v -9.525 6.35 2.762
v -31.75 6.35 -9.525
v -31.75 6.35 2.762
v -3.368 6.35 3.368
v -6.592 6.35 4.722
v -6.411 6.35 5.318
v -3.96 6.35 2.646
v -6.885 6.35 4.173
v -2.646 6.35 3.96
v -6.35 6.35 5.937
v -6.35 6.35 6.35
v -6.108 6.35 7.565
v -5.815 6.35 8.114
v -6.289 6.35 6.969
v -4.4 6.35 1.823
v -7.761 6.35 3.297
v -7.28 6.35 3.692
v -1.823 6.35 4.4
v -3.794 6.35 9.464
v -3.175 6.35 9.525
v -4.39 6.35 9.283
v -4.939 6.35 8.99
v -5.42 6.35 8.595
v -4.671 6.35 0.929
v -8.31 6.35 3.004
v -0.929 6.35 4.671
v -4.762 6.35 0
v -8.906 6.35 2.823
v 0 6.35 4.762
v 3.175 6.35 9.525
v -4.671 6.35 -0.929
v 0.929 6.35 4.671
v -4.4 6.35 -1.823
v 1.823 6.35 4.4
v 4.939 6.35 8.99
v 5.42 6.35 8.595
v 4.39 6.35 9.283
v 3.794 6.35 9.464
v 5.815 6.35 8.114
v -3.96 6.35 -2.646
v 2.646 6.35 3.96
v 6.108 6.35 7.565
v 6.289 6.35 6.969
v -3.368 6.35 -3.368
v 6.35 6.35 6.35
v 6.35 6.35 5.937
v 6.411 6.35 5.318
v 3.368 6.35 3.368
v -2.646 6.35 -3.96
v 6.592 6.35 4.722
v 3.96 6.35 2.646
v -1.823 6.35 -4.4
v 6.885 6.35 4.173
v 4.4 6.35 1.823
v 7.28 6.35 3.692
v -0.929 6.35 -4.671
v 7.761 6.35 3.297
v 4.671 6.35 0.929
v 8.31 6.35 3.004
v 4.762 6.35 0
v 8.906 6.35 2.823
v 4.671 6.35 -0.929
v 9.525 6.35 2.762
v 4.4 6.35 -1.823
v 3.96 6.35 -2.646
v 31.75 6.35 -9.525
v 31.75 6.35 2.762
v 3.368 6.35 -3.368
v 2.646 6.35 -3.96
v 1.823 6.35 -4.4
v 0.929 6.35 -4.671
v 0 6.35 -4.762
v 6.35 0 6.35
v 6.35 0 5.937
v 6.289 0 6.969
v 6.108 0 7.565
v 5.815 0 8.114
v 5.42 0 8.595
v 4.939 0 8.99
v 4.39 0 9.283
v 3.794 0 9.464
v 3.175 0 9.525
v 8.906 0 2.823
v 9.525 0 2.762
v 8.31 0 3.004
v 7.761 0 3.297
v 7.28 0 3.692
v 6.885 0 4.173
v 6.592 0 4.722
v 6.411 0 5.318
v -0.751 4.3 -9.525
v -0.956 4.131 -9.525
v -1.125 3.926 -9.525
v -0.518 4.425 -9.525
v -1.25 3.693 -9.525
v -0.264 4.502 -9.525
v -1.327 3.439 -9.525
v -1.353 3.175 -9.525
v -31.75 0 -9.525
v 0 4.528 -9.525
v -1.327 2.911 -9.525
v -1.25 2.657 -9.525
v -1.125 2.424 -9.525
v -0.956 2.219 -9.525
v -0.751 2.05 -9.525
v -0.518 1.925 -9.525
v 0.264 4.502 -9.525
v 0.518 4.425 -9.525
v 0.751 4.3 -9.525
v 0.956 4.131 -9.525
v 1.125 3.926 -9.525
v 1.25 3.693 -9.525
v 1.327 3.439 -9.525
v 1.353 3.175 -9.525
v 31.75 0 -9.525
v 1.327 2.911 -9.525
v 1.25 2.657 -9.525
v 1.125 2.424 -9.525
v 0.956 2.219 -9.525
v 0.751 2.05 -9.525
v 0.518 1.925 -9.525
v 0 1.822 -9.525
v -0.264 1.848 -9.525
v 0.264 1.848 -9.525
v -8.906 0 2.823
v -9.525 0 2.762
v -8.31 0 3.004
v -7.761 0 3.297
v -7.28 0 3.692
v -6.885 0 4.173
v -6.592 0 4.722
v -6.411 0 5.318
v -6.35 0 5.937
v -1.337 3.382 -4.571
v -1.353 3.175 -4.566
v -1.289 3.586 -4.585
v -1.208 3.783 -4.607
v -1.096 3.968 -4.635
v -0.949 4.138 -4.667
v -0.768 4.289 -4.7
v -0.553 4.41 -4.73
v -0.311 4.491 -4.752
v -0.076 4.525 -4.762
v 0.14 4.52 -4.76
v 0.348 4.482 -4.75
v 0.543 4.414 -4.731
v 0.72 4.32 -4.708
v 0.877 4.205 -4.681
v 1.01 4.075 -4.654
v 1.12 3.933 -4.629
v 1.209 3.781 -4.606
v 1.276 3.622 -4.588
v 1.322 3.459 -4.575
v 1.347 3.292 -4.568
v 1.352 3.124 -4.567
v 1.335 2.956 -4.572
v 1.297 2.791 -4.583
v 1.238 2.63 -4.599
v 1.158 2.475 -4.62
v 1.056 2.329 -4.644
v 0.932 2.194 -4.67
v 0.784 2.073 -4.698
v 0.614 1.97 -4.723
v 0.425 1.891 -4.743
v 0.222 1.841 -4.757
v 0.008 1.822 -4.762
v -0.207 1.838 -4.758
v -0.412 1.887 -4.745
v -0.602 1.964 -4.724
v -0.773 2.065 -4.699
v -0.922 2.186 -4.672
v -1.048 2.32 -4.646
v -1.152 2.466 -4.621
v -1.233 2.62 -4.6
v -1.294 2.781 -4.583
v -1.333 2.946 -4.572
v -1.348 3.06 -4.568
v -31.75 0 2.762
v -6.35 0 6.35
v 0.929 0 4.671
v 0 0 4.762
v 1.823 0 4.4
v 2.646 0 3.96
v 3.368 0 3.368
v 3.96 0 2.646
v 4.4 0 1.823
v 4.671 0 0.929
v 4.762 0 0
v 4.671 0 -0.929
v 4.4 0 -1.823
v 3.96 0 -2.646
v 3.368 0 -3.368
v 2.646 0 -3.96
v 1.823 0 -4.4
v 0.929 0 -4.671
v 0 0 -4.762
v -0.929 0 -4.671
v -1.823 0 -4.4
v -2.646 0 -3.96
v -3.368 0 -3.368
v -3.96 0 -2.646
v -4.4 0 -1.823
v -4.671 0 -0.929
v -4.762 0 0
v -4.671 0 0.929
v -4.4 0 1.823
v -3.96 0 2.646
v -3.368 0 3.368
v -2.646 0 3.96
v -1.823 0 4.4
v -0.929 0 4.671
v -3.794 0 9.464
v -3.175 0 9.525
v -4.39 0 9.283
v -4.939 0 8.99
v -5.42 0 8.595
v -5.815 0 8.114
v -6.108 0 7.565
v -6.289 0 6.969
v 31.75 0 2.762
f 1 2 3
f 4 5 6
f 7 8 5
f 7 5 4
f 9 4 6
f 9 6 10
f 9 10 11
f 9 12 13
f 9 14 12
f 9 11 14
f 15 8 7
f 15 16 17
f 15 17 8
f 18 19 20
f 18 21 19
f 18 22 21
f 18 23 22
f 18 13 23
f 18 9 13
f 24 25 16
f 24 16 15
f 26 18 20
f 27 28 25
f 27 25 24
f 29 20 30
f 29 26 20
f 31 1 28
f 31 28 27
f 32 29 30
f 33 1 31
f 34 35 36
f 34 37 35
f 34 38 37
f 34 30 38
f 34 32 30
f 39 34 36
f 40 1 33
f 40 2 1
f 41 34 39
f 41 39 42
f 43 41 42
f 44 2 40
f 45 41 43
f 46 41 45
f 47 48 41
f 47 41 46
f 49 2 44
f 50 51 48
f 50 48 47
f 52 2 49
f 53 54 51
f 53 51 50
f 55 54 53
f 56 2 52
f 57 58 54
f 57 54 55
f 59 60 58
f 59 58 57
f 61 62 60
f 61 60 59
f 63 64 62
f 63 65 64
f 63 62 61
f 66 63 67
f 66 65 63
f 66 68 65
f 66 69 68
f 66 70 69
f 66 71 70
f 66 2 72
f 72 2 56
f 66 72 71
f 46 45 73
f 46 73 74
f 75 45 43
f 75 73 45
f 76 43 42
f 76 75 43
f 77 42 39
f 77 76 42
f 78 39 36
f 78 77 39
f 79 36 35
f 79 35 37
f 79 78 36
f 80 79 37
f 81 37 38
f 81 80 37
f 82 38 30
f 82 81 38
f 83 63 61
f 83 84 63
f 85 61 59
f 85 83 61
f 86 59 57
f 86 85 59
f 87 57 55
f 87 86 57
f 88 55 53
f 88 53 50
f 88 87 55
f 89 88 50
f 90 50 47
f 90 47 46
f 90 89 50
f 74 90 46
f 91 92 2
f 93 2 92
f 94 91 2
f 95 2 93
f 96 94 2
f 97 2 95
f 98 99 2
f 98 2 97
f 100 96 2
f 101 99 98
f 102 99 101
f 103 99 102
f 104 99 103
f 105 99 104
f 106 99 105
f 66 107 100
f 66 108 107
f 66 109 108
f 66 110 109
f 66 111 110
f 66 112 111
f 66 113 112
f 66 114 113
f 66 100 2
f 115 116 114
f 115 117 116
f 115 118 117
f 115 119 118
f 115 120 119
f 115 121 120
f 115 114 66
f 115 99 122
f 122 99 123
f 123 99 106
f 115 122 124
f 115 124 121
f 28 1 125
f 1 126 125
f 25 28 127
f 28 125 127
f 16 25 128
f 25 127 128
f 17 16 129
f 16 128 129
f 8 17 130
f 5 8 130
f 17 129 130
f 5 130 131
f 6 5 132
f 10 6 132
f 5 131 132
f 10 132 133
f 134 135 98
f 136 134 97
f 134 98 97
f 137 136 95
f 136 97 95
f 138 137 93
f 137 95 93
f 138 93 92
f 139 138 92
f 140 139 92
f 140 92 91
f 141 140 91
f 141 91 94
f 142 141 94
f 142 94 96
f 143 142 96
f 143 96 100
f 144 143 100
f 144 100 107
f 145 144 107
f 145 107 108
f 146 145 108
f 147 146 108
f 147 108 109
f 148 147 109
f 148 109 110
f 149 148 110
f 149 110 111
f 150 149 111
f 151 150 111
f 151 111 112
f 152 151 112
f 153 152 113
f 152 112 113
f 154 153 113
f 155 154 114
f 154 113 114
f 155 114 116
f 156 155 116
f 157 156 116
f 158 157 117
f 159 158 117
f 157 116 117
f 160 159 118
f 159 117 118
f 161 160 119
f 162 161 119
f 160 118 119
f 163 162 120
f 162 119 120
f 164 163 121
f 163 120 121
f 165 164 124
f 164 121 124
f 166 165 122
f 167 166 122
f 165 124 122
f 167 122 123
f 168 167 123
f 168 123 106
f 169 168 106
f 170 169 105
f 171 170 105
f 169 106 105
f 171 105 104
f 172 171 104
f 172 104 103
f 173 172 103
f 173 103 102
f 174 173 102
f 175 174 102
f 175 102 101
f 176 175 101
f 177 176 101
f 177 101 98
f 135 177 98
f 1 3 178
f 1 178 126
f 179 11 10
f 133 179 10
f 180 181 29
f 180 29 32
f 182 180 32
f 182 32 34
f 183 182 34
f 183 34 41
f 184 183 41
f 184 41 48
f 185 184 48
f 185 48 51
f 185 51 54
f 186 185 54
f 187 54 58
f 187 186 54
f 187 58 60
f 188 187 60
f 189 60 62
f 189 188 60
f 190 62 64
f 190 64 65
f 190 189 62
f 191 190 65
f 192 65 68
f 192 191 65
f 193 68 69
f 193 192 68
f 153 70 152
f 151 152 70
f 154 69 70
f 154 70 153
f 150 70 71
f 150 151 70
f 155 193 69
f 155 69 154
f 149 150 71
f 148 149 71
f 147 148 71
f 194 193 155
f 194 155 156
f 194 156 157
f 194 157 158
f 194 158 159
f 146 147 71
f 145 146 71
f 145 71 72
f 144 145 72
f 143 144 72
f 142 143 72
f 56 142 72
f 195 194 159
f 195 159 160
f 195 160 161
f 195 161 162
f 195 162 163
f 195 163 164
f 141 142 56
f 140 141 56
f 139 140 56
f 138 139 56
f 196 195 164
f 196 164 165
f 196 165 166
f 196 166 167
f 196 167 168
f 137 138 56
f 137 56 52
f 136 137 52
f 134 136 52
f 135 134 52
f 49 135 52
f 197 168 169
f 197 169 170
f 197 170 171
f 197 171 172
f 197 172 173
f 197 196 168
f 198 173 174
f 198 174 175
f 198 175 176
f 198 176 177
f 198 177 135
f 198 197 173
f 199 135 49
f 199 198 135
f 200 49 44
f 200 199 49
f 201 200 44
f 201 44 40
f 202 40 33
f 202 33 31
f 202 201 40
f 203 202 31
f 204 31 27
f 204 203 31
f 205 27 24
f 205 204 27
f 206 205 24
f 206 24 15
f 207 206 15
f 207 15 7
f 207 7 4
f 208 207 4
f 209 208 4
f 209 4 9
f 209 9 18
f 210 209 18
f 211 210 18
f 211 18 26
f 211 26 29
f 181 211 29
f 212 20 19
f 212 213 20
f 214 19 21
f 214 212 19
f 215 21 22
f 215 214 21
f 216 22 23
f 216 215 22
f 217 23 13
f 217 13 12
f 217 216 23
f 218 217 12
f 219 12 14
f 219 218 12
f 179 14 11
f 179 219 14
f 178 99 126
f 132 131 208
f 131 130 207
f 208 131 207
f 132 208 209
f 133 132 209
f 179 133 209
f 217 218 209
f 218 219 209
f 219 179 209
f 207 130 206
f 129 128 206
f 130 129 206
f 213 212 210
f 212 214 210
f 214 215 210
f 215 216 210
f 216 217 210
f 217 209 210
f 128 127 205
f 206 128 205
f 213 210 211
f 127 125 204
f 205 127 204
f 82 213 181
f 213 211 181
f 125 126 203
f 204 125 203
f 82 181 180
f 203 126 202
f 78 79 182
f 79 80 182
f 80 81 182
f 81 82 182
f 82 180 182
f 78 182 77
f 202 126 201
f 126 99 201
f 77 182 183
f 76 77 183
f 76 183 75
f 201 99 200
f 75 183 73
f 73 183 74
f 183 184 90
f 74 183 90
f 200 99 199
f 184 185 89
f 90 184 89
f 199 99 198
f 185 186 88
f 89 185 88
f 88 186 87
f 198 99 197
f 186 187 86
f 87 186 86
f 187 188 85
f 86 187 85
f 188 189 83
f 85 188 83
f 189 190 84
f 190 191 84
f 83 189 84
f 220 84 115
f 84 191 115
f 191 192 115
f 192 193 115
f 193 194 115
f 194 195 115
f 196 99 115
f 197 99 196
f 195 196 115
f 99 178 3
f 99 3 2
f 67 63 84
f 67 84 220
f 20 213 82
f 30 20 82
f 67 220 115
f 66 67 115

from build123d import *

# Parameters (mm, degrees)
SKETCH1_W                  = 63.5
SKETCH1_H                  = 19.05
SKETCH1_R                  = 4.7625
BOSS_EXTRUDE1_DEPTH        = 6.35
F_6_32_TAPPED_HOLE1_REACH  = 39.567
F_6_32_TAPPED_HOLE1_BORE_R = 1.35255
CUT_EXTRUDE1_REACH         = 35.751
SKETCH5_W                  = 25.4
SKETCH5_H                  = 6.7627246
FILLET1_R                  = 3.175


with BuildPart() as part:
    # Sketch1 → Boss-Extrude1 (new body)
    with BuildSketch(Plane(origin=(0, 0, 0), x_dir=(1, 0, 0), z_dir=(0, 1, 0))):
        Rectangle(SKETCH1_W, SKETCH1_H)
        with Locations(Location((0, 0, 0), (0, 0, 270))):
            Circle(SKETCH1_R, mode=Mode.SUBTRACT)
    extrude(amount=BOSS_EXTRUDE1_DEPTH)

    # #6-32 Tapped Hole1 bore → #6-32 Tapped Hole1 (cut, up to next)
    with BuildSketch(Plane(origin=(0, 0, -9.525), x_dir=(-1, 0, 0), z_dir=(0, 0, -1)), mode=Mode.PRIVATE) as f_6_32_tapped_hole1_sk1:
        with Locations((0, 3.175)):
            Circle(F_6_32_TAPPED_HOLE1_BORE_R)
    f_6_32_tapped_hole1_tool1 = extrude(f_6_32_tapped_hole1_sk1.sketch, amount=-F_6_32_TAPPED_HOLE1_REACH, mode=Mode.PRIVATE) & part.part
    add(f_6_32_tapped_hole1_tool1.solids().sort_by_distance((0, 3.175, -9.525))[0], mode=Mode.SUBTRACT)

    # Sketch5 → Cut-Extrude1 (cut, up to next)
    with BuildSketch(Plane(origin=(0, 6.35, 0), x_dir=(1, 0, 0), z_dir=(0, 1, 0)), mode=Mode.PRIVATE) as cut_extrude1_sk1:
        with Locations((19.05, -6.1436377)):
            Rectangle(SKETCH5_W, SKETCH5_H)
    cut_extrude1_tool1 = extrude(cut_extrude1_sk1.sketch, amount=-CUT_EXTRUDE1_REACH, mode=Mode.PRIVATE) & part.part
    # Sketch5 → Cut-Extrude1 (cut, up to next)
    with BuildSketch(Plane(origin=(0, 6.35, 0), x_dir=(1, 0, 0), z_dir=(0, 1, 0)), mode=Mode.PRIVATE) as cut_extrude1_sk2:
        with Locations((-19.05, -6.1436377)):
            Rectangle(SKETCH5_W, SKETCH5_H)
    cut_extrude1_tool2 = extrude(cut_extrude1_sk2.sketch, amount=-CUT_EXTRUDE1_REACH, mode=Mode.PRIVATE) & part.part
    add(cut_extrude1_tool1.solids().sort_by_distance((19.05, 6.35, 6.143638))[0], mode=Mode.SUBTRACT)
    add(cut_extrude1_tool2.solids().sort_by_distance((-19.05, 6.35, 6.143638))[0], mode=Mode.SUBTRACT)

    # Fillet1
    fillet1_edges = [part.edges().sort_by_distance(p)[0] for p in [
        (-6.35, 3.175, 2.7622754),
        (-6.35, 3.175, 9.525),
        (6.35, 3.175, 9.525),
        (6.35, 3.175, 2.7622754),
    ]]
    fillet(fillet1_edges, radius=FILLET1_R)


solid = part.part
